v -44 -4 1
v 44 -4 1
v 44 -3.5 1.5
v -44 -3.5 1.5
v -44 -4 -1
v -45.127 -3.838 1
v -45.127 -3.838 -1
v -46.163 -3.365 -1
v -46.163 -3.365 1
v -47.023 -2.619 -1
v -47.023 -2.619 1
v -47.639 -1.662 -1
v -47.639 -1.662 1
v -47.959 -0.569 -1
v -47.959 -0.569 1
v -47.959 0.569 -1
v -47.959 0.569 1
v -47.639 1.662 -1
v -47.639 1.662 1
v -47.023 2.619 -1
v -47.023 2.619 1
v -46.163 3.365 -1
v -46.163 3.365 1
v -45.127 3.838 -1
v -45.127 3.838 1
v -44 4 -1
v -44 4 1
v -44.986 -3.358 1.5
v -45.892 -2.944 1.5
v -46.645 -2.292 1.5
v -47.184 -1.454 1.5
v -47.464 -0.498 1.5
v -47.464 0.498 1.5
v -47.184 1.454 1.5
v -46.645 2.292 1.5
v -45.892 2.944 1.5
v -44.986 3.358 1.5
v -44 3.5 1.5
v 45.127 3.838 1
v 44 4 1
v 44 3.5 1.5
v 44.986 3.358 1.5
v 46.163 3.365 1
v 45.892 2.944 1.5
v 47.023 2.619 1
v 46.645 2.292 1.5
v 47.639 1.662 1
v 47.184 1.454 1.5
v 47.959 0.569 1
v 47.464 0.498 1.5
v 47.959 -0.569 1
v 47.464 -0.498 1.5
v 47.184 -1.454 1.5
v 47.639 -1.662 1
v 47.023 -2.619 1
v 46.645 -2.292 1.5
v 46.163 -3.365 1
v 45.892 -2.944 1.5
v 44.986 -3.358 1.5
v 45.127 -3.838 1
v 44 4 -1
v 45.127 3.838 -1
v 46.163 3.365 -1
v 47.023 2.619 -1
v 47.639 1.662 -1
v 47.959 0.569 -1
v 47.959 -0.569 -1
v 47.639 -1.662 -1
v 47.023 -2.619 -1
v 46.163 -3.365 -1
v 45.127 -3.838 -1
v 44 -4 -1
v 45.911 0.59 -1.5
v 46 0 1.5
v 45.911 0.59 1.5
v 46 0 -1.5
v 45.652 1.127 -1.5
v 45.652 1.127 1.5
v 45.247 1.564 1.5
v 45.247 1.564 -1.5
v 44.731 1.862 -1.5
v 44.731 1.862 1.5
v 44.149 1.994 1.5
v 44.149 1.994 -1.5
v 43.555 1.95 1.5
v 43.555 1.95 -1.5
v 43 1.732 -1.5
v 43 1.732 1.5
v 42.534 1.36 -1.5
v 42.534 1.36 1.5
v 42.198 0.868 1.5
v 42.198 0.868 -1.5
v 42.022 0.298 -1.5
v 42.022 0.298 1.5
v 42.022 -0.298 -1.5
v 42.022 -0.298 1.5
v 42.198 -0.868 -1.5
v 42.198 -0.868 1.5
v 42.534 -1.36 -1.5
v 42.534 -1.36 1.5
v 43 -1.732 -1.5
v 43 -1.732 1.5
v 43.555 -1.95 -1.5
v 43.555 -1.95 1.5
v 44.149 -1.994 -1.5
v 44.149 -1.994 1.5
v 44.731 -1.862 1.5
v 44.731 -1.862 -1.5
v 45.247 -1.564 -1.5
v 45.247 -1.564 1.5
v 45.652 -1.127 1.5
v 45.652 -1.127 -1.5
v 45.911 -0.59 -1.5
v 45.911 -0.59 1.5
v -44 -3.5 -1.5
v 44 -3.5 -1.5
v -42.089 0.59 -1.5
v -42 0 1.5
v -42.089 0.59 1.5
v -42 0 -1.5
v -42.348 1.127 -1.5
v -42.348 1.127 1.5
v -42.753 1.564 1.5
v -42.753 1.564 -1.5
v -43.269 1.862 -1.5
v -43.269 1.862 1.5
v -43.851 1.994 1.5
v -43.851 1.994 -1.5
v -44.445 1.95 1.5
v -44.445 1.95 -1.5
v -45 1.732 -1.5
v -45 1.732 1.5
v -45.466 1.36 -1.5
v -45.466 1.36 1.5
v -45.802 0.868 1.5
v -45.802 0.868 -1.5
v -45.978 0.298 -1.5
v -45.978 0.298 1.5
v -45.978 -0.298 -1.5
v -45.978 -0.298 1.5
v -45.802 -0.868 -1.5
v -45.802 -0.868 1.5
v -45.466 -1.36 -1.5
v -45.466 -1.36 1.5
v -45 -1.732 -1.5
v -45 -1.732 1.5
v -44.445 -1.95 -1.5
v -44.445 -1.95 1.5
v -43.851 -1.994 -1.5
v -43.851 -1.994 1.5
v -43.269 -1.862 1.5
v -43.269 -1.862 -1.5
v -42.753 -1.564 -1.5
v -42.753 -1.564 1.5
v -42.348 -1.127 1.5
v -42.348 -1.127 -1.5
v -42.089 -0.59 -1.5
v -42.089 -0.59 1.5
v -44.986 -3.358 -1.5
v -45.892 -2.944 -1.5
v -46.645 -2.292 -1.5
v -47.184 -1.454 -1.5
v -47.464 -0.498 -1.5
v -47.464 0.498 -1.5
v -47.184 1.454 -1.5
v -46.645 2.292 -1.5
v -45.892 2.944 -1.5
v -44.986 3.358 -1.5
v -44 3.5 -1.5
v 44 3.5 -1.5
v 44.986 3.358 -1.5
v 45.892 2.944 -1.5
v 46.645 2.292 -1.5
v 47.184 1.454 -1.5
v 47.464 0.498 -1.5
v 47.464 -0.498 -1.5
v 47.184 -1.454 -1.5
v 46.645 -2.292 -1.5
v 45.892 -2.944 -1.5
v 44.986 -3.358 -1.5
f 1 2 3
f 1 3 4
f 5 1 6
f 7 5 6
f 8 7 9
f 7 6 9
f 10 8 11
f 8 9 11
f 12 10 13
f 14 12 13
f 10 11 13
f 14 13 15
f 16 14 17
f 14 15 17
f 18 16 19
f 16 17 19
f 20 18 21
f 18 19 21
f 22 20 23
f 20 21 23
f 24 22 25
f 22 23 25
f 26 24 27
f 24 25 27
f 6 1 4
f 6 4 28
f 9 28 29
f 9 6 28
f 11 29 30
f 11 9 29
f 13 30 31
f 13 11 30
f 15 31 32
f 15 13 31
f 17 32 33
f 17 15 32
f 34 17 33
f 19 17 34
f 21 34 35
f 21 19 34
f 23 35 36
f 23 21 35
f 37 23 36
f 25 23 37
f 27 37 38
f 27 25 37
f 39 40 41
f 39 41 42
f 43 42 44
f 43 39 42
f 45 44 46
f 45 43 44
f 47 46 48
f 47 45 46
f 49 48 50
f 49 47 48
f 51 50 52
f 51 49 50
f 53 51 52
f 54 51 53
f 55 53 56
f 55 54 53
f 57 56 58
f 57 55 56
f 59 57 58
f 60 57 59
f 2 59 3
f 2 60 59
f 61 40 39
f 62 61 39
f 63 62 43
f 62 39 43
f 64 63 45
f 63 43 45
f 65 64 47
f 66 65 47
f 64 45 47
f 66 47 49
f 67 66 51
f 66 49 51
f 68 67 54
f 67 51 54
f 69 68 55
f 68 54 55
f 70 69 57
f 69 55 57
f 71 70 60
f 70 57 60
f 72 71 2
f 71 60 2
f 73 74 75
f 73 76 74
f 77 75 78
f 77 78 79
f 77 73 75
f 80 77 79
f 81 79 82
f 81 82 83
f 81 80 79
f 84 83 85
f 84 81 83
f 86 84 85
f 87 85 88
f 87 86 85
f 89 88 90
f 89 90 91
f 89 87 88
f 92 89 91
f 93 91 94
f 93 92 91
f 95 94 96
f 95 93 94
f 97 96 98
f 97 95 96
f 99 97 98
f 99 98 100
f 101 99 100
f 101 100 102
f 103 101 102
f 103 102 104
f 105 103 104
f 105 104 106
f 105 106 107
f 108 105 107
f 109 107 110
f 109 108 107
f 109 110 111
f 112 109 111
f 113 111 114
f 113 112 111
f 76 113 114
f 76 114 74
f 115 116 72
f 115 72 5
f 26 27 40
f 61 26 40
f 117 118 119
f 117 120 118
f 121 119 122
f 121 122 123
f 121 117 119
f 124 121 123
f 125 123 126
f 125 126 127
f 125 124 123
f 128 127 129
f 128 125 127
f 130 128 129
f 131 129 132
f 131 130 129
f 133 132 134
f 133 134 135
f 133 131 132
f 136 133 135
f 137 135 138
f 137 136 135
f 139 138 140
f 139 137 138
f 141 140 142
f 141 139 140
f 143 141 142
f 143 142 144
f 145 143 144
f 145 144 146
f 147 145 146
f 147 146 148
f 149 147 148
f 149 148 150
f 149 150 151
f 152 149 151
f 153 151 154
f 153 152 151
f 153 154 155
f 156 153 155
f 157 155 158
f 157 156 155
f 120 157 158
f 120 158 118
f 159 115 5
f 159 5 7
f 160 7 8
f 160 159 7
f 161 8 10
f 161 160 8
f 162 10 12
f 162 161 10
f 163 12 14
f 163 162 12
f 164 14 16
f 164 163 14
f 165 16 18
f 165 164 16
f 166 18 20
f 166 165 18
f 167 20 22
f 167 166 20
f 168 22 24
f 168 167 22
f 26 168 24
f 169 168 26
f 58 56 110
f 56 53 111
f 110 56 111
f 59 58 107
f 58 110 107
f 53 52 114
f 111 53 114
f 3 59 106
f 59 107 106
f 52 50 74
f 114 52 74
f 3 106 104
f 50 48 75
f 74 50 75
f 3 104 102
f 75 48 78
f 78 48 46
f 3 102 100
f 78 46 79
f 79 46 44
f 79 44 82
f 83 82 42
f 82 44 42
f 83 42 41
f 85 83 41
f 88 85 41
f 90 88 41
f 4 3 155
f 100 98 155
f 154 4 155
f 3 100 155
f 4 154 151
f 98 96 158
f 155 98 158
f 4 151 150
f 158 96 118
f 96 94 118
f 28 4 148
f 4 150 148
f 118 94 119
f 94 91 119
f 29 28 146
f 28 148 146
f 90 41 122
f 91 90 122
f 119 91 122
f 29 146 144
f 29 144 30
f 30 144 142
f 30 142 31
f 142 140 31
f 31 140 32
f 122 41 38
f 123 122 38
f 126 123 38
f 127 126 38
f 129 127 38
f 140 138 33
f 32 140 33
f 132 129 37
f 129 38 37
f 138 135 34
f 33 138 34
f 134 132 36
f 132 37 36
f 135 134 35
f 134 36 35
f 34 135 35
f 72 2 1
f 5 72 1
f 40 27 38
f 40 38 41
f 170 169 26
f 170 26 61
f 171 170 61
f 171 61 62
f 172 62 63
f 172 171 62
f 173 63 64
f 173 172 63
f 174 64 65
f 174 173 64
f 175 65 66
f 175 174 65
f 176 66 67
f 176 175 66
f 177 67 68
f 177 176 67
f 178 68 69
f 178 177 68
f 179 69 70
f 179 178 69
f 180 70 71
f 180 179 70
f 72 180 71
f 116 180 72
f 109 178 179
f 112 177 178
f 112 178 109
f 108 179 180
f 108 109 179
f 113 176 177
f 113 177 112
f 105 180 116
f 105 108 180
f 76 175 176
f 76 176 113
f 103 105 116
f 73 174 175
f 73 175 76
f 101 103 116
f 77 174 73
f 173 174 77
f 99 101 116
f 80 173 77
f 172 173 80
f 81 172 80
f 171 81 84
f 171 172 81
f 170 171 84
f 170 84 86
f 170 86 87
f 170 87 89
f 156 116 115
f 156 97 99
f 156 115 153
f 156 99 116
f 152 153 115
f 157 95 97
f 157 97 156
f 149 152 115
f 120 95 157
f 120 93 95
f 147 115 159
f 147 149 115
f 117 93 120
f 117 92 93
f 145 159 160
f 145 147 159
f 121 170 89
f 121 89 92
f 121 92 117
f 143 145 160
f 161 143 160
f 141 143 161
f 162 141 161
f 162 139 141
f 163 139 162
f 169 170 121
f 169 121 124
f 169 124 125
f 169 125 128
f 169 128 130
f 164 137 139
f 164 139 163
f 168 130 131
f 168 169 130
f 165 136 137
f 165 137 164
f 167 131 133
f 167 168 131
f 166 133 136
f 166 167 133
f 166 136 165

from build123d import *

# Parameters (mm, degrees)
SKETCH1_R           = 2
BOSS_EXTRUDE1_DEPTH = 1.5
CHAMFER1_SIZE       = 0.5


with BuildPart() as part:
    # Sketch1 → Boss-Extrude1 (new body, symmetric)
    with BuildSketch(Plane.XY):
        with BuildLine():
            Line((-44, 4), (44, 4))
            ThreePointArc((44, 4), (48, 0), (44, -4))
            Line((44, -4), (-44, -4))
            ThreePointArc((-44, -4), (-48, 0), (-44, 4))
        make_face()
        with Locations((-44, 0)):
            Circle(SKETCH1_R, mode=Mode.SUBTRACT)
        with Locations((44, 0)):
            Circle(SKETCH1_R, mode=Mode.SUBTRACT)
    extrude(amount=BOSS_EXTRUDE1_DEPTH, both=True)

    # Chamfer1
    chamfer1_edges = [part.edges().sort_by_distance(p)[0] for p in [
        (48, 0, 1.5),
        (0, 4, 1.5),
        (-48, 0, 1.5),
        (0, 4, -1.5),
        (48, 0, -1.5),
        (0, -4, -1.5),
        (-48, 0, -1.5),
        (0, -4, 1.5),
    ]]
    chamfer(chamfer1_edges, length=CHAMFER1_SIZE)


solid = part.part
